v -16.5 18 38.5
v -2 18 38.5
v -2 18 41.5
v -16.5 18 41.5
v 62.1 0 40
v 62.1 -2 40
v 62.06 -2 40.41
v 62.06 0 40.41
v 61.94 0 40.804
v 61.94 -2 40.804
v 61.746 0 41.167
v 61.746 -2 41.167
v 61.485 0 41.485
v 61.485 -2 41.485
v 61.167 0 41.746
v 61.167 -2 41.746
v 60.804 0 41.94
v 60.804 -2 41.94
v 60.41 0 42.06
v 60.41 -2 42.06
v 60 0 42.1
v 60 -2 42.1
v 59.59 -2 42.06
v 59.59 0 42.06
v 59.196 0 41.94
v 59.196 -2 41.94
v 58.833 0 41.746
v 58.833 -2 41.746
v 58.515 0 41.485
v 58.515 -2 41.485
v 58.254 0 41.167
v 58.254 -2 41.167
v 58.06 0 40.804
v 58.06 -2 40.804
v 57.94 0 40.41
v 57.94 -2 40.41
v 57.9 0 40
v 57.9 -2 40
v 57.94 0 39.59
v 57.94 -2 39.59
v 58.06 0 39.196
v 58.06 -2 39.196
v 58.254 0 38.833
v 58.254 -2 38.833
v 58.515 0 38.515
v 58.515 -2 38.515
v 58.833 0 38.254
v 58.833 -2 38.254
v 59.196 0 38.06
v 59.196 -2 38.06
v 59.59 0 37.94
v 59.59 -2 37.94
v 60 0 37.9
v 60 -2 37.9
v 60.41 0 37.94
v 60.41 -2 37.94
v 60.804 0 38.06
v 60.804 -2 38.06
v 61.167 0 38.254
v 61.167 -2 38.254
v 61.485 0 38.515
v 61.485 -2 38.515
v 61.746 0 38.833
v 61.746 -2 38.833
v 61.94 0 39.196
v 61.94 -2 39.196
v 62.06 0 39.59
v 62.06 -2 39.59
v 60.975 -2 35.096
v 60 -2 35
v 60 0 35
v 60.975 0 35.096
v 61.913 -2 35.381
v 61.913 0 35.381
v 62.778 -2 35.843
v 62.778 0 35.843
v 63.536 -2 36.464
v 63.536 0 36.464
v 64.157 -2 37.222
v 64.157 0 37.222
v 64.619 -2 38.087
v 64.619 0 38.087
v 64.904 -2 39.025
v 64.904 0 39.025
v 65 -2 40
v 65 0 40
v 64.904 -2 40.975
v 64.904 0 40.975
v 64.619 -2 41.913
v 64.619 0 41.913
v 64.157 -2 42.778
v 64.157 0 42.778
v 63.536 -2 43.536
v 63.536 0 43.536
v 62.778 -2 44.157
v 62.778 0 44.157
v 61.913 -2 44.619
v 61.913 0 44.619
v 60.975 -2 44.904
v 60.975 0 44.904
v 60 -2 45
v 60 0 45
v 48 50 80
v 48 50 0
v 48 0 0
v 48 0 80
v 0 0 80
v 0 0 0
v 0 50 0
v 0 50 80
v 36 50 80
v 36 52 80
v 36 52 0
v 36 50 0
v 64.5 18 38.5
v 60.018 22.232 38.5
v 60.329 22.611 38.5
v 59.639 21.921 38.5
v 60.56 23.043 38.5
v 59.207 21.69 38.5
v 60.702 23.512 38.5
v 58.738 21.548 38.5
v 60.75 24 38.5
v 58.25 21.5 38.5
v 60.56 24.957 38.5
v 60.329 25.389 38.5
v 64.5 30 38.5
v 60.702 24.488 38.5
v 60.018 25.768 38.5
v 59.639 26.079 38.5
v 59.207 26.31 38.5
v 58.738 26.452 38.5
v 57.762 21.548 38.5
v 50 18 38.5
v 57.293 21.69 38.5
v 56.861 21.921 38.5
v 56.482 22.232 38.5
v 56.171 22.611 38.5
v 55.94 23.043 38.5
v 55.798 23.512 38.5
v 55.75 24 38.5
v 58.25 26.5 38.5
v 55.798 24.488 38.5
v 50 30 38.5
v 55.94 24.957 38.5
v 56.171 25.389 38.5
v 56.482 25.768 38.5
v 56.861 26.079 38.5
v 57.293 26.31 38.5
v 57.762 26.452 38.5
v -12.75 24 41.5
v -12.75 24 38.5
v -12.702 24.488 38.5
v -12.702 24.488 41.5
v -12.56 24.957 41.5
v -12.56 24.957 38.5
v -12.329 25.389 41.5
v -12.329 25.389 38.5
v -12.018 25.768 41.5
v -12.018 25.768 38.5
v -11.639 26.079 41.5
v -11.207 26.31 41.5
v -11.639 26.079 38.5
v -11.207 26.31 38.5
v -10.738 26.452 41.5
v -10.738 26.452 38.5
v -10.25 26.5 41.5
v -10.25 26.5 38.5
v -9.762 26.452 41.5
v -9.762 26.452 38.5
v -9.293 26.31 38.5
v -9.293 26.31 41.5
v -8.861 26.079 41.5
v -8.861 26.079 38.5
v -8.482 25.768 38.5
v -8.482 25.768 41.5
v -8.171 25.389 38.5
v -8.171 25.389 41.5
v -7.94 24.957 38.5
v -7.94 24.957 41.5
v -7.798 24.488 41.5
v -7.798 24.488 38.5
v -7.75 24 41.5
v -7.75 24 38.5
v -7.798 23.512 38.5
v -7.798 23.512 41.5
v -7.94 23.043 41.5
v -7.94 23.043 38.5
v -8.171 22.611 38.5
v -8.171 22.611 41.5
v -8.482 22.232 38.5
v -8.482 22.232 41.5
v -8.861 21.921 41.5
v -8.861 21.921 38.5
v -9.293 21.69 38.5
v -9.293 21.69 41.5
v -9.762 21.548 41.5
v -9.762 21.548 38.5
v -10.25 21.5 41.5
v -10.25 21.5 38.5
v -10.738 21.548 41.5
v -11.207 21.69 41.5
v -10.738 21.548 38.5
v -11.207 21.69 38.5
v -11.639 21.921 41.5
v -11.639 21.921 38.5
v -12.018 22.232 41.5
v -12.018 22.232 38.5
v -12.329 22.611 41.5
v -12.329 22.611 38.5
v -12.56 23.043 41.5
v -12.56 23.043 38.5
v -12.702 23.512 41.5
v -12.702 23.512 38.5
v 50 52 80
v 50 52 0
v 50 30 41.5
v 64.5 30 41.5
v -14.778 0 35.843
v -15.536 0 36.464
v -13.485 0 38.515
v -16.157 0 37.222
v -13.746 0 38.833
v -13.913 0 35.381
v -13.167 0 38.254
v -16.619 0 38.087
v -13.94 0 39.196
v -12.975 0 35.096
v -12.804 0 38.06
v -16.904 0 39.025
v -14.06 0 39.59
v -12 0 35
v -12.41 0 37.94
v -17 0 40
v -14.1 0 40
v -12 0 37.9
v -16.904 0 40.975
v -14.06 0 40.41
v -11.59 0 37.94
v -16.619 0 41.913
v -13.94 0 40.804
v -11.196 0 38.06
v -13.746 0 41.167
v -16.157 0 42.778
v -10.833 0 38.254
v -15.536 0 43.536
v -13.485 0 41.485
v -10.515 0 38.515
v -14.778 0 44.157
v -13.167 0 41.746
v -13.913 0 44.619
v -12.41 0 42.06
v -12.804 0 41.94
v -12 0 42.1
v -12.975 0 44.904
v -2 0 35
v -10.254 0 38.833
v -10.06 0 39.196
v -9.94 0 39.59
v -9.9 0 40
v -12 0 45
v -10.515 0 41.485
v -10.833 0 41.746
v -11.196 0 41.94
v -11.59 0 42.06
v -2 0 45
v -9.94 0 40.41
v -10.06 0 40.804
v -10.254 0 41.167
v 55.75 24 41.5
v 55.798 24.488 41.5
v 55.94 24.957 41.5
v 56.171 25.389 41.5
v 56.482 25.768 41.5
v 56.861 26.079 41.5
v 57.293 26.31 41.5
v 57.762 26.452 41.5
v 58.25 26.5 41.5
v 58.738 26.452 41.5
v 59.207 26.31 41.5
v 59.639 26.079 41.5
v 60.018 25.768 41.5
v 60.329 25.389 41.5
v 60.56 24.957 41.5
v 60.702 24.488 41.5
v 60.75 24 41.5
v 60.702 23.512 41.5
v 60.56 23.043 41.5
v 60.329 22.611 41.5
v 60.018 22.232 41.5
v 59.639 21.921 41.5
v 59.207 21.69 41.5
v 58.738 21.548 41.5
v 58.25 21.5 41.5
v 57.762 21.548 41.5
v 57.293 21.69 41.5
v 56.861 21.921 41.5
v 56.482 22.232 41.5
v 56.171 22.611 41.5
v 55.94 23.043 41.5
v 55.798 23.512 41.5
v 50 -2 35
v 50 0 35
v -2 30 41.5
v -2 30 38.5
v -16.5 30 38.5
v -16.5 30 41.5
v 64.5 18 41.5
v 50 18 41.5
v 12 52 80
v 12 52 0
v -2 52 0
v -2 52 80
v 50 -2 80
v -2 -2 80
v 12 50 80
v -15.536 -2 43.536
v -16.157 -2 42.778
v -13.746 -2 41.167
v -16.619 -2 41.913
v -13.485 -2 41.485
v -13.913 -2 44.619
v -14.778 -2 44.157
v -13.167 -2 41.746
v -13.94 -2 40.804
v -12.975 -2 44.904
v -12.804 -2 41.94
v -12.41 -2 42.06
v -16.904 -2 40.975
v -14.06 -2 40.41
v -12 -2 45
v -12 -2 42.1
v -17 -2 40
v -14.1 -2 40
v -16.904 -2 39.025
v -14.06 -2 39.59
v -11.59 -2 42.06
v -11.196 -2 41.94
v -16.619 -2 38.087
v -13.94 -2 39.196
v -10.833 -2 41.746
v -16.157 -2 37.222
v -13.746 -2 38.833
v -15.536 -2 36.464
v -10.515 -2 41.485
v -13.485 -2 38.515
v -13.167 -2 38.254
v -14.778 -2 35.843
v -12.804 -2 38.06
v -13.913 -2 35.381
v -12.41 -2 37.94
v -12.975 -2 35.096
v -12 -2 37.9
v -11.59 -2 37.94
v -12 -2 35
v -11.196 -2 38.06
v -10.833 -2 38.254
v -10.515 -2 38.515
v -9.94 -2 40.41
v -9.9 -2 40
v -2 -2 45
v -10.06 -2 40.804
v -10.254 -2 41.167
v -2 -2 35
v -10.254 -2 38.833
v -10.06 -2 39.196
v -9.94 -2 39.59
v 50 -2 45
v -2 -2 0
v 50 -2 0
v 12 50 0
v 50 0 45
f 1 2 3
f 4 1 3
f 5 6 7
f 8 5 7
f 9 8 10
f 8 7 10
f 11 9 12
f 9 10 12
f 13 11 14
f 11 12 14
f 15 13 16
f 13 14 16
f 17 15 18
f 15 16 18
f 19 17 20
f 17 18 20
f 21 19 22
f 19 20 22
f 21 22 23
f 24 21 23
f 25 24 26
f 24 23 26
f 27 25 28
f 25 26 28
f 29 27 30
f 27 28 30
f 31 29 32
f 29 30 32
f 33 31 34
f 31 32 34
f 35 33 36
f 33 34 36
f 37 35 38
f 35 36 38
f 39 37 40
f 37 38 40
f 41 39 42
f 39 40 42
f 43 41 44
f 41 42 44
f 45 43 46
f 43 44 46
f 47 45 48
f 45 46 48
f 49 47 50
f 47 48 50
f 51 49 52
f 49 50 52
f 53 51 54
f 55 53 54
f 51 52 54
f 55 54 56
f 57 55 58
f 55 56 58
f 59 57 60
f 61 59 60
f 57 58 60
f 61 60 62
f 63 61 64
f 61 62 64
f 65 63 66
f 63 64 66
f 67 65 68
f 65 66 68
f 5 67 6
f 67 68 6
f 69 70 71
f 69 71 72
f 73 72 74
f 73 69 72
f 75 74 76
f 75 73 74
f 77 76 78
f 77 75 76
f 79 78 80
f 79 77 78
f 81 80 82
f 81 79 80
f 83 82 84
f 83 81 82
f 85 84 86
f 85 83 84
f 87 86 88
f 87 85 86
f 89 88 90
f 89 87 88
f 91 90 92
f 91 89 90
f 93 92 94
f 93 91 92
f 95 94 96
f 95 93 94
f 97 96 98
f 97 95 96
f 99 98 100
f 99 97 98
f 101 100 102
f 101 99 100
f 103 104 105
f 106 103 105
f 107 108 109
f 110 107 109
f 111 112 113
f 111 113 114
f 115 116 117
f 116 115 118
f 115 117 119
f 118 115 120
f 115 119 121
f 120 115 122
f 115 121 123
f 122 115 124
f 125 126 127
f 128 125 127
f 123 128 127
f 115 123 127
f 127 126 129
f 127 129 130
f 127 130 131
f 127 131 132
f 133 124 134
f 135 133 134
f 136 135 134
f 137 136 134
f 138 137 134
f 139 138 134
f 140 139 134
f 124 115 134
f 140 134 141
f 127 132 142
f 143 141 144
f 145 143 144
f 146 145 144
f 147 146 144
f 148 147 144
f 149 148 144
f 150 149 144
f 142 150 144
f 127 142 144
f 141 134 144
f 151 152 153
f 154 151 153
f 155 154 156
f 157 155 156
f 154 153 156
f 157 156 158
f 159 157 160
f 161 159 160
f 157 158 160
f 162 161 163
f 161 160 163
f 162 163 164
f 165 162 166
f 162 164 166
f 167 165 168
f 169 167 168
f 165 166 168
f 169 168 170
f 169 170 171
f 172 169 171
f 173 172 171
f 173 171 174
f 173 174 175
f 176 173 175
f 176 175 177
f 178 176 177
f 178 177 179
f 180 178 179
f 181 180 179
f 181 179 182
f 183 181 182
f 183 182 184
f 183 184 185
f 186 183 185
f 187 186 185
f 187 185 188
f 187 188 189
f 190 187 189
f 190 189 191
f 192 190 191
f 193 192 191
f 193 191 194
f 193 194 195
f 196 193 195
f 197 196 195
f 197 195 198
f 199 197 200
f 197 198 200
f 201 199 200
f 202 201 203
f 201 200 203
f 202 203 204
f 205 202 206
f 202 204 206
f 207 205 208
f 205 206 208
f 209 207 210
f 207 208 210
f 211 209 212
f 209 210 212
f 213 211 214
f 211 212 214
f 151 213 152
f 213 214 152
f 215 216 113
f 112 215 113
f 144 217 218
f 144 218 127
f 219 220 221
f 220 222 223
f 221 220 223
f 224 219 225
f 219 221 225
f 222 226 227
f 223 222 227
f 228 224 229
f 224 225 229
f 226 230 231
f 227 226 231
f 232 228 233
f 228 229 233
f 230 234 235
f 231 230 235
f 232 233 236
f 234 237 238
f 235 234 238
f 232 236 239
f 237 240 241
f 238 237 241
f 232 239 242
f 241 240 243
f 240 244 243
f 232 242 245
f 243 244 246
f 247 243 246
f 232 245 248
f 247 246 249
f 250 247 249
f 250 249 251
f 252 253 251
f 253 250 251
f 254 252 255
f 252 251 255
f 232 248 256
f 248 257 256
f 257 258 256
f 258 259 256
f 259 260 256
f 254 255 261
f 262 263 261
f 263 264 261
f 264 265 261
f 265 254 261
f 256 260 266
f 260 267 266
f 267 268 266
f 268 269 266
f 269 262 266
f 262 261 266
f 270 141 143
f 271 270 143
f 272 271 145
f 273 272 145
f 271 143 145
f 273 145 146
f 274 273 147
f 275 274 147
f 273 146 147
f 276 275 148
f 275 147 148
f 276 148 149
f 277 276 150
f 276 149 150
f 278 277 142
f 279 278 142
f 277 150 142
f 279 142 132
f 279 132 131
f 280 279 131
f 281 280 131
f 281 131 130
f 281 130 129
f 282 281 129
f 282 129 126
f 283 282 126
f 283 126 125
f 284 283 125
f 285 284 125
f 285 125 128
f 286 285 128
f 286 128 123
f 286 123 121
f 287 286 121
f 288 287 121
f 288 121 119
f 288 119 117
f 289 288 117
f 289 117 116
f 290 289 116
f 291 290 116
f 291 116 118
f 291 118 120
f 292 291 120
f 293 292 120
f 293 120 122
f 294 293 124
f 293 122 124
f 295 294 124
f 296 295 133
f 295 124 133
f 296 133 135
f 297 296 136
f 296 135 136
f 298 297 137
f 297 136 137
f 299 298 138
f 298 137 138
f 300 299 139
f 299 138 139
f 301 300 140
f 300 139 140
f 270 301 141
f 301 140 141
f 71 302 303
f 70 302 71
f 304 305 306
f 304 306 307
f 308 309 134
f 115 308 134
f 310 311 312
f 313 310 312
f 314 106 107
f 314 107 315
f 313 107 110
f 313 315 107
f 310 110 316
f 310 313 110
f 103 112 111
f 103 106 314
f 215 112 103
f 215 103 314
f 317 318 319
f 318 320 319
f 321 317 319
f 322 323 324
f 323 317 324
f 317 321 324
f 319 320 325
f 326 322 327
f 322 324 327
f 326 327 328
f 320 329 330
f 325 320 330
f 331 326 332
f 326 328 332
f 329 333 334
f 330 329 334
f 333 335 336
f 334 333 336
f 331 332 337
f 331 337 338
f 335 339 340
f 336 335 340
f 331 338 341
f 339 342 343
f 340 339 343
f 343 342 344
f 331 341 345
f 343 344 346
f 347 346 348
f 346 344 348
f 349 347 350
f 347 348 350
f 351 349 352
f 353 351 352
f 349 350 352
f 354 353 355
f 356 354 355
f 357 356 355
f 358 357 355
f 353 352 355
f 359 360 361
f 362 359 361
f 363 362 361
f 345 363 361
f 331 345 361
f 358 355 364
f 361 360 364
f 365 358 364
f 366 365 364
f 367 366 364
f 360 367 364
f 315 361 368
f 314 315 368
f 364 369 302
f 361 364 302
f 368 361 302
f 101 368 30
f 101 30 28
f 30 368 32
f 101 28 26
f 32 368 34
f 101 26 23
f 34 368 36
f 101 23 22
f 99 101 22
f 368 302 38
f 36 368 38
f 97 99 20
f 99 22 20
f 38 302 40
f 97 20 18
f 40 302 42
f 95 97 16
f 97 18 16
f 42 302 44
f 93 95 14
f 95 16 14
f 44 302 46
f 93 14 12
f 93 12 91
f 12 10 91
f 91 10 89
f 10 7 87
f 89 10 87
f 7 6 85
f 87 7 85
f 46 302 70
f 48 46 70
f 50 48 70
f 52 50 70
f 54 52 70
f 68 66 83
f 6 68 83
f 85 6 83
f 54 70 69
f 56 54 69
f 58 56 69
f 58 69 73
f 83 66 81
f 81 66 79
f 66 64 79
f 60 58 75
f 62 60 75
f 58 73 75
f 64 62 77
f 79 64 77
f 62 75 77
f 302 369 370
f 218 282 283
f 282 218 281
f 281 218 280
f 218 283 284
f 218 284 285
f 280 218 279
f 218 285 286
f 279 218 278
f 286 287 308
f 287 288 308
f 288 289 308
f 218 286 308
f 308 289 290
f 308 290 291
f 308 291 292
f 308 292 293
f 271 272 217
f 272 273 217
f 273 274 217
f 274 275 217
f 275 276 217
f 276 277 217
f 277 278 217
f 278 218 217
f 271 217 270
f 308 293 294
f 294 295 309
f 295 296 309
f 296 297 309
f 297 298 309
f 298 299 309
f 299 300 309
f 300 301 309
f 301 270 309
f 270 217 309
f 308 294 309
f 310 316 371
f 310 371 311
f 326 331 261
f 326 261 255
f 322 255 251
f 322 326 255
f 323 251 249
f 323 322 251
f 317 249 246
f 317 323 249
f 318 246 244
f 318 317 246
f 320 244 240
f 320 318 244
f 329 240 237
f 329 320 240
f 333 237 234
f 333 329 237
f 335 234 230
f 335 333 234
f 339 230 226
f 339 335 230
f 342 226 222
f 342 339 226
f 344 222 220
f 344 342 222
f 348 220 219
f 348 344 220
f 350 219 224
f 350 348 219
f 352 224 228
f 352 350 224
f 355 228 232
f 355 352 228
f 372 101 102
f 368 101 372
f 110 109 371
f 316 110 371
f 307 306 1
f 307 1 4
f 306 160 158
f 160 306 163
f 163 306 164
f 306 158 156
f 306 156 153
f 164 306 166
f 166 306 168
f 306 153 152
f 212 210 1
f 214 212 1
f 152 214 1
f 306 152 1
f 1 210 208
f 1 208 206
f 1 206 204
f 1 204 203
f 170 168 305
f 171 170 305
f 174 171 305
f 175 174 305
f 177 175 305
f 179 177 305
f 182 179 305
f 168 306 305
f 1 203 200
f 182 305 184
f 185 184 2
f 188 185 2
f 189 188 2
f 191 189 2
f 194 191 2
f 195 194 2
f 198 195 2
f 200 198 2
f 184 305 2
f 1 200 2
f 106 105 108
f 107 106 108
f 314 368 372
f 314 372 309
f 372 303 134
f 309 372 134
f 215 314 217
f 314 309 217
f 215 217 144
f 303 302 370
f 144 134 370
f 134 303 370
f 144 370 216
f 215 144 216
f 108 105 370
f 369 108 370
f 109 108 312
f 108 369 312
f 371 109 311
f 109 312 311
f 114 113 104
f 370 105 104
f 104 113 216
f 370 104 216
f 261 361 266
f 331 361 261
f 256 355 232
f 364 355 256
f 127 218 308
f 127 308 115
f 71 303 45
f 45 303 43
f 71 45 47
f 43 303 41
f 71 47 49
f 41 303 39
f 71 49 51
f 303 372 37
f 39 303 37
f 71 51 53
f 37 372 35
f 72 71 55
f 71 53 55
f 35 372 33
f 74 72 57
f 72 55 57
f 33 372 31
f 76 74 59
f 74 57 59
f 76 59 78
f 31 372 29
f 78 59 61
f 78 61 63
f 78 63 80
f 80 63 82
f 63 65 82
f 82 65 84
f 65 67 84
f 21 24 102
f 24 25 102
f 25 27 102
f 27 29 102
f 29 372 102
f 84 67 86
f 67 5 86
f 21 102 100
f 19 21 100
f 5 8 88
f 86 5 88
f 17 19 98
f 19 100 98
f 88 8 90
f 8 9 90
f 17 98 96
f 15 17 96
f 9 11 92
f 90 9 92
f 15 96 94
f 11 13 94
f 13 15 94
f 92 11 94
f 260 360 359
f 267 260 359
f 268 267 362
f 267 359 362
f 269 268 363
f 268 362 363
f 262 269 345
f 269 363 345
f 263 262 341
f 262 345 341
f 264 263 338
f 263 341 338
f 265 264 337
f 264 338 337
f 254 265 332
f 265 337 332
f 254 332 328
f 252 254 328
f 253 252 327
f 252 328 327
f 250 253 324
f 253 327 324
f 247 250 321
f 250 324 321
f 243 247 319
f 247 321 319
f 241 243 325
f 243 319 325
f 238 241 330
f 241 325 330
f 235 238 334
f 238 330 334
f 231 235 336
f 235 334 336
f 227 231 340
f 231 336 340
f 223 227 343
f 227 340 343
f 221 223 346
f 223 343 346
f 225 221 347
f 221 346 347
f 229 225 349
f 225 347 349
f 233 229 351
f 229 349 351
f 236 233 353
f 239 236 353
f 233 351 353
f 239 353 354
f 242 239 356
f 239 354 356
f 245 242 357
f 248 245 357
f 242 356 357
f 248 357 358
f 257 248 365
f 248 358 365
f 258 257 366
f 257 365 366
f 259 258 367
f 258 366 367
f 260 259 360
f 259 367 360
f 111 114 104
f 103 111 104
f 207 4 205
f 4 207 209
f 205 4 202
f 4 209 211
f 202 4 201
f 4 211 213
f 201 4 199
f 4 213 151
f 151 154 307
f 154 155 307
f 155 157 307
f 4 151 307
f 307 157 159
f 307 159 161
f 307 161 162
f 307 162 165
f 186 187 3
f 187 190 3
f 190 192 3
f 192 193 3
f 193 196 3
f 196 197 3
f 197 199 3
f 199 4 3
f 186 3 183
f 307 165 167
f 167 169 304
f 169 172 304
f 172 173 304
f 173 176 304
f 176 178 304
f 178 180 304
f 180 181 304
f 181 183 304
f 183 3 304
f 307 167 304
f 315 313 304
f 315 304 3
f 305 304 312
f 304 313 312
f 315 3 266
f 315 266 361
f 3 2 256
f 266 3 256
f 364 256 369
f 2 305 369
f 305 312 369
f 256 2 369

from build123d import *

# Parameters (mm, degrees)
BOSS_EXTRUDE1_DEPTH = 80
SKETCH2_R           = 2.1
BOSS_EXTRUDE2_DEPTH = 2
SKETCH3_W           = 3
SKETCH3_H           = 5
SKETCH3_H_2         = 7
BOSS_EXTRUDE3_DEPTH = 14.5
SKETCH5_W           = 3
SKETCH5_H           = 5
SKETCH5_H_2         = 7
BOSS_EXTRUDE4_DEPTH = 14.5
SKETCH8_R           = 2.5
CUT_EXTRUDE1_DEPTH  = 10


with BuildPart() as part:
    # Sketch1 → Boss-Extrude1 (new body)
    with BuildSketch(Plane.XY):
        Polygon((0, 0), (0, 50), (12, 50), (12, 52), (-2, 52), (-2, 25), (-2, -2), (50, -2), (50, 52), (36, 52), (36, 50), (48, 50), (48, 0), align=None)
    extrude(amount=BOSS_EXTRUDE1_DEPTH)

    # Sketch2 → Boss-Extrude2 (add)
    with BuildSketch(Plane.XZ.offset(2)):
        with BuildLine():
            Line((60, 45), (50, 45))
            Line((50, 45), (50, 35))
            Line((50, 35), (60, 35))
            ThreePointArc((60, 35), (65, 40), (60, 45))
        make_face()
        with Locations((60, 40)):
            Circle(SKETCH2_R, mode=Mode.SUBTRACT)
        with BuildLine():
            Line((-2, 35), (-2, 45))
            Line((-2, 45), (-12, 45))
            ThreePointArc((-12, 45), (-17, 40), (-12, 35))
            Line((-12, 35), (-2, 35))
        make_face()
        with Locations((-12, 40)):
            Circle(SKETCH2_R, mode=Mode.SUBTRACT)
    extrude(amount=-BOSS_EXTRUDE2_DEPTH)

    # Sketch3 → Boss-Extrude3 (add)
    with BuildSketch(Plane.ZY.offset(2)):
        with Locations((40, 27.5)):
            Rectangle(SKETCH3_W, SKETCH3_H)
        with Locations((40, 21.5)):
            Rectangle(SKETCH3_W, SKETCH3_H_2)
    extrude(amount=BOSS_EXTRUDE3_DEPTH)

    # Sketch5 → Boss-Extrude4 (add)
    with BuildSketch(Plane(origin=(50, 0, 0), x_dir=(0, 0, -1), z_dir=(1, 0, 0))):
        with Locations((-40, 27.5)):
            Rectangle(SKETCH5_W, SKETCH5_H)
        with Locations((-40, 21.5)):
            Rectangle(SKETCH5_W, SKETCH5_H_2)
    extrude(amount=BOSS_EXTRUDE4_DEPTH)

    # Sketch8 → Cut-Extrude1 (cut)
    with BuildSketch(Plane(origin=(0, 0, 38.5), x_dir=(-1, 0, 0), z_dir=(0, 0, -1))):
        with Locations((-58.25, 24)):
            Circle(SKETCH8_R)
        with Locations((10.25, 24)):
            Circle(SKETCH8_R)
    extrude(amount=-CUT_EXTRUDE1_DEPTH, mode=Mode.SUBTRACT)


solid = part.part
